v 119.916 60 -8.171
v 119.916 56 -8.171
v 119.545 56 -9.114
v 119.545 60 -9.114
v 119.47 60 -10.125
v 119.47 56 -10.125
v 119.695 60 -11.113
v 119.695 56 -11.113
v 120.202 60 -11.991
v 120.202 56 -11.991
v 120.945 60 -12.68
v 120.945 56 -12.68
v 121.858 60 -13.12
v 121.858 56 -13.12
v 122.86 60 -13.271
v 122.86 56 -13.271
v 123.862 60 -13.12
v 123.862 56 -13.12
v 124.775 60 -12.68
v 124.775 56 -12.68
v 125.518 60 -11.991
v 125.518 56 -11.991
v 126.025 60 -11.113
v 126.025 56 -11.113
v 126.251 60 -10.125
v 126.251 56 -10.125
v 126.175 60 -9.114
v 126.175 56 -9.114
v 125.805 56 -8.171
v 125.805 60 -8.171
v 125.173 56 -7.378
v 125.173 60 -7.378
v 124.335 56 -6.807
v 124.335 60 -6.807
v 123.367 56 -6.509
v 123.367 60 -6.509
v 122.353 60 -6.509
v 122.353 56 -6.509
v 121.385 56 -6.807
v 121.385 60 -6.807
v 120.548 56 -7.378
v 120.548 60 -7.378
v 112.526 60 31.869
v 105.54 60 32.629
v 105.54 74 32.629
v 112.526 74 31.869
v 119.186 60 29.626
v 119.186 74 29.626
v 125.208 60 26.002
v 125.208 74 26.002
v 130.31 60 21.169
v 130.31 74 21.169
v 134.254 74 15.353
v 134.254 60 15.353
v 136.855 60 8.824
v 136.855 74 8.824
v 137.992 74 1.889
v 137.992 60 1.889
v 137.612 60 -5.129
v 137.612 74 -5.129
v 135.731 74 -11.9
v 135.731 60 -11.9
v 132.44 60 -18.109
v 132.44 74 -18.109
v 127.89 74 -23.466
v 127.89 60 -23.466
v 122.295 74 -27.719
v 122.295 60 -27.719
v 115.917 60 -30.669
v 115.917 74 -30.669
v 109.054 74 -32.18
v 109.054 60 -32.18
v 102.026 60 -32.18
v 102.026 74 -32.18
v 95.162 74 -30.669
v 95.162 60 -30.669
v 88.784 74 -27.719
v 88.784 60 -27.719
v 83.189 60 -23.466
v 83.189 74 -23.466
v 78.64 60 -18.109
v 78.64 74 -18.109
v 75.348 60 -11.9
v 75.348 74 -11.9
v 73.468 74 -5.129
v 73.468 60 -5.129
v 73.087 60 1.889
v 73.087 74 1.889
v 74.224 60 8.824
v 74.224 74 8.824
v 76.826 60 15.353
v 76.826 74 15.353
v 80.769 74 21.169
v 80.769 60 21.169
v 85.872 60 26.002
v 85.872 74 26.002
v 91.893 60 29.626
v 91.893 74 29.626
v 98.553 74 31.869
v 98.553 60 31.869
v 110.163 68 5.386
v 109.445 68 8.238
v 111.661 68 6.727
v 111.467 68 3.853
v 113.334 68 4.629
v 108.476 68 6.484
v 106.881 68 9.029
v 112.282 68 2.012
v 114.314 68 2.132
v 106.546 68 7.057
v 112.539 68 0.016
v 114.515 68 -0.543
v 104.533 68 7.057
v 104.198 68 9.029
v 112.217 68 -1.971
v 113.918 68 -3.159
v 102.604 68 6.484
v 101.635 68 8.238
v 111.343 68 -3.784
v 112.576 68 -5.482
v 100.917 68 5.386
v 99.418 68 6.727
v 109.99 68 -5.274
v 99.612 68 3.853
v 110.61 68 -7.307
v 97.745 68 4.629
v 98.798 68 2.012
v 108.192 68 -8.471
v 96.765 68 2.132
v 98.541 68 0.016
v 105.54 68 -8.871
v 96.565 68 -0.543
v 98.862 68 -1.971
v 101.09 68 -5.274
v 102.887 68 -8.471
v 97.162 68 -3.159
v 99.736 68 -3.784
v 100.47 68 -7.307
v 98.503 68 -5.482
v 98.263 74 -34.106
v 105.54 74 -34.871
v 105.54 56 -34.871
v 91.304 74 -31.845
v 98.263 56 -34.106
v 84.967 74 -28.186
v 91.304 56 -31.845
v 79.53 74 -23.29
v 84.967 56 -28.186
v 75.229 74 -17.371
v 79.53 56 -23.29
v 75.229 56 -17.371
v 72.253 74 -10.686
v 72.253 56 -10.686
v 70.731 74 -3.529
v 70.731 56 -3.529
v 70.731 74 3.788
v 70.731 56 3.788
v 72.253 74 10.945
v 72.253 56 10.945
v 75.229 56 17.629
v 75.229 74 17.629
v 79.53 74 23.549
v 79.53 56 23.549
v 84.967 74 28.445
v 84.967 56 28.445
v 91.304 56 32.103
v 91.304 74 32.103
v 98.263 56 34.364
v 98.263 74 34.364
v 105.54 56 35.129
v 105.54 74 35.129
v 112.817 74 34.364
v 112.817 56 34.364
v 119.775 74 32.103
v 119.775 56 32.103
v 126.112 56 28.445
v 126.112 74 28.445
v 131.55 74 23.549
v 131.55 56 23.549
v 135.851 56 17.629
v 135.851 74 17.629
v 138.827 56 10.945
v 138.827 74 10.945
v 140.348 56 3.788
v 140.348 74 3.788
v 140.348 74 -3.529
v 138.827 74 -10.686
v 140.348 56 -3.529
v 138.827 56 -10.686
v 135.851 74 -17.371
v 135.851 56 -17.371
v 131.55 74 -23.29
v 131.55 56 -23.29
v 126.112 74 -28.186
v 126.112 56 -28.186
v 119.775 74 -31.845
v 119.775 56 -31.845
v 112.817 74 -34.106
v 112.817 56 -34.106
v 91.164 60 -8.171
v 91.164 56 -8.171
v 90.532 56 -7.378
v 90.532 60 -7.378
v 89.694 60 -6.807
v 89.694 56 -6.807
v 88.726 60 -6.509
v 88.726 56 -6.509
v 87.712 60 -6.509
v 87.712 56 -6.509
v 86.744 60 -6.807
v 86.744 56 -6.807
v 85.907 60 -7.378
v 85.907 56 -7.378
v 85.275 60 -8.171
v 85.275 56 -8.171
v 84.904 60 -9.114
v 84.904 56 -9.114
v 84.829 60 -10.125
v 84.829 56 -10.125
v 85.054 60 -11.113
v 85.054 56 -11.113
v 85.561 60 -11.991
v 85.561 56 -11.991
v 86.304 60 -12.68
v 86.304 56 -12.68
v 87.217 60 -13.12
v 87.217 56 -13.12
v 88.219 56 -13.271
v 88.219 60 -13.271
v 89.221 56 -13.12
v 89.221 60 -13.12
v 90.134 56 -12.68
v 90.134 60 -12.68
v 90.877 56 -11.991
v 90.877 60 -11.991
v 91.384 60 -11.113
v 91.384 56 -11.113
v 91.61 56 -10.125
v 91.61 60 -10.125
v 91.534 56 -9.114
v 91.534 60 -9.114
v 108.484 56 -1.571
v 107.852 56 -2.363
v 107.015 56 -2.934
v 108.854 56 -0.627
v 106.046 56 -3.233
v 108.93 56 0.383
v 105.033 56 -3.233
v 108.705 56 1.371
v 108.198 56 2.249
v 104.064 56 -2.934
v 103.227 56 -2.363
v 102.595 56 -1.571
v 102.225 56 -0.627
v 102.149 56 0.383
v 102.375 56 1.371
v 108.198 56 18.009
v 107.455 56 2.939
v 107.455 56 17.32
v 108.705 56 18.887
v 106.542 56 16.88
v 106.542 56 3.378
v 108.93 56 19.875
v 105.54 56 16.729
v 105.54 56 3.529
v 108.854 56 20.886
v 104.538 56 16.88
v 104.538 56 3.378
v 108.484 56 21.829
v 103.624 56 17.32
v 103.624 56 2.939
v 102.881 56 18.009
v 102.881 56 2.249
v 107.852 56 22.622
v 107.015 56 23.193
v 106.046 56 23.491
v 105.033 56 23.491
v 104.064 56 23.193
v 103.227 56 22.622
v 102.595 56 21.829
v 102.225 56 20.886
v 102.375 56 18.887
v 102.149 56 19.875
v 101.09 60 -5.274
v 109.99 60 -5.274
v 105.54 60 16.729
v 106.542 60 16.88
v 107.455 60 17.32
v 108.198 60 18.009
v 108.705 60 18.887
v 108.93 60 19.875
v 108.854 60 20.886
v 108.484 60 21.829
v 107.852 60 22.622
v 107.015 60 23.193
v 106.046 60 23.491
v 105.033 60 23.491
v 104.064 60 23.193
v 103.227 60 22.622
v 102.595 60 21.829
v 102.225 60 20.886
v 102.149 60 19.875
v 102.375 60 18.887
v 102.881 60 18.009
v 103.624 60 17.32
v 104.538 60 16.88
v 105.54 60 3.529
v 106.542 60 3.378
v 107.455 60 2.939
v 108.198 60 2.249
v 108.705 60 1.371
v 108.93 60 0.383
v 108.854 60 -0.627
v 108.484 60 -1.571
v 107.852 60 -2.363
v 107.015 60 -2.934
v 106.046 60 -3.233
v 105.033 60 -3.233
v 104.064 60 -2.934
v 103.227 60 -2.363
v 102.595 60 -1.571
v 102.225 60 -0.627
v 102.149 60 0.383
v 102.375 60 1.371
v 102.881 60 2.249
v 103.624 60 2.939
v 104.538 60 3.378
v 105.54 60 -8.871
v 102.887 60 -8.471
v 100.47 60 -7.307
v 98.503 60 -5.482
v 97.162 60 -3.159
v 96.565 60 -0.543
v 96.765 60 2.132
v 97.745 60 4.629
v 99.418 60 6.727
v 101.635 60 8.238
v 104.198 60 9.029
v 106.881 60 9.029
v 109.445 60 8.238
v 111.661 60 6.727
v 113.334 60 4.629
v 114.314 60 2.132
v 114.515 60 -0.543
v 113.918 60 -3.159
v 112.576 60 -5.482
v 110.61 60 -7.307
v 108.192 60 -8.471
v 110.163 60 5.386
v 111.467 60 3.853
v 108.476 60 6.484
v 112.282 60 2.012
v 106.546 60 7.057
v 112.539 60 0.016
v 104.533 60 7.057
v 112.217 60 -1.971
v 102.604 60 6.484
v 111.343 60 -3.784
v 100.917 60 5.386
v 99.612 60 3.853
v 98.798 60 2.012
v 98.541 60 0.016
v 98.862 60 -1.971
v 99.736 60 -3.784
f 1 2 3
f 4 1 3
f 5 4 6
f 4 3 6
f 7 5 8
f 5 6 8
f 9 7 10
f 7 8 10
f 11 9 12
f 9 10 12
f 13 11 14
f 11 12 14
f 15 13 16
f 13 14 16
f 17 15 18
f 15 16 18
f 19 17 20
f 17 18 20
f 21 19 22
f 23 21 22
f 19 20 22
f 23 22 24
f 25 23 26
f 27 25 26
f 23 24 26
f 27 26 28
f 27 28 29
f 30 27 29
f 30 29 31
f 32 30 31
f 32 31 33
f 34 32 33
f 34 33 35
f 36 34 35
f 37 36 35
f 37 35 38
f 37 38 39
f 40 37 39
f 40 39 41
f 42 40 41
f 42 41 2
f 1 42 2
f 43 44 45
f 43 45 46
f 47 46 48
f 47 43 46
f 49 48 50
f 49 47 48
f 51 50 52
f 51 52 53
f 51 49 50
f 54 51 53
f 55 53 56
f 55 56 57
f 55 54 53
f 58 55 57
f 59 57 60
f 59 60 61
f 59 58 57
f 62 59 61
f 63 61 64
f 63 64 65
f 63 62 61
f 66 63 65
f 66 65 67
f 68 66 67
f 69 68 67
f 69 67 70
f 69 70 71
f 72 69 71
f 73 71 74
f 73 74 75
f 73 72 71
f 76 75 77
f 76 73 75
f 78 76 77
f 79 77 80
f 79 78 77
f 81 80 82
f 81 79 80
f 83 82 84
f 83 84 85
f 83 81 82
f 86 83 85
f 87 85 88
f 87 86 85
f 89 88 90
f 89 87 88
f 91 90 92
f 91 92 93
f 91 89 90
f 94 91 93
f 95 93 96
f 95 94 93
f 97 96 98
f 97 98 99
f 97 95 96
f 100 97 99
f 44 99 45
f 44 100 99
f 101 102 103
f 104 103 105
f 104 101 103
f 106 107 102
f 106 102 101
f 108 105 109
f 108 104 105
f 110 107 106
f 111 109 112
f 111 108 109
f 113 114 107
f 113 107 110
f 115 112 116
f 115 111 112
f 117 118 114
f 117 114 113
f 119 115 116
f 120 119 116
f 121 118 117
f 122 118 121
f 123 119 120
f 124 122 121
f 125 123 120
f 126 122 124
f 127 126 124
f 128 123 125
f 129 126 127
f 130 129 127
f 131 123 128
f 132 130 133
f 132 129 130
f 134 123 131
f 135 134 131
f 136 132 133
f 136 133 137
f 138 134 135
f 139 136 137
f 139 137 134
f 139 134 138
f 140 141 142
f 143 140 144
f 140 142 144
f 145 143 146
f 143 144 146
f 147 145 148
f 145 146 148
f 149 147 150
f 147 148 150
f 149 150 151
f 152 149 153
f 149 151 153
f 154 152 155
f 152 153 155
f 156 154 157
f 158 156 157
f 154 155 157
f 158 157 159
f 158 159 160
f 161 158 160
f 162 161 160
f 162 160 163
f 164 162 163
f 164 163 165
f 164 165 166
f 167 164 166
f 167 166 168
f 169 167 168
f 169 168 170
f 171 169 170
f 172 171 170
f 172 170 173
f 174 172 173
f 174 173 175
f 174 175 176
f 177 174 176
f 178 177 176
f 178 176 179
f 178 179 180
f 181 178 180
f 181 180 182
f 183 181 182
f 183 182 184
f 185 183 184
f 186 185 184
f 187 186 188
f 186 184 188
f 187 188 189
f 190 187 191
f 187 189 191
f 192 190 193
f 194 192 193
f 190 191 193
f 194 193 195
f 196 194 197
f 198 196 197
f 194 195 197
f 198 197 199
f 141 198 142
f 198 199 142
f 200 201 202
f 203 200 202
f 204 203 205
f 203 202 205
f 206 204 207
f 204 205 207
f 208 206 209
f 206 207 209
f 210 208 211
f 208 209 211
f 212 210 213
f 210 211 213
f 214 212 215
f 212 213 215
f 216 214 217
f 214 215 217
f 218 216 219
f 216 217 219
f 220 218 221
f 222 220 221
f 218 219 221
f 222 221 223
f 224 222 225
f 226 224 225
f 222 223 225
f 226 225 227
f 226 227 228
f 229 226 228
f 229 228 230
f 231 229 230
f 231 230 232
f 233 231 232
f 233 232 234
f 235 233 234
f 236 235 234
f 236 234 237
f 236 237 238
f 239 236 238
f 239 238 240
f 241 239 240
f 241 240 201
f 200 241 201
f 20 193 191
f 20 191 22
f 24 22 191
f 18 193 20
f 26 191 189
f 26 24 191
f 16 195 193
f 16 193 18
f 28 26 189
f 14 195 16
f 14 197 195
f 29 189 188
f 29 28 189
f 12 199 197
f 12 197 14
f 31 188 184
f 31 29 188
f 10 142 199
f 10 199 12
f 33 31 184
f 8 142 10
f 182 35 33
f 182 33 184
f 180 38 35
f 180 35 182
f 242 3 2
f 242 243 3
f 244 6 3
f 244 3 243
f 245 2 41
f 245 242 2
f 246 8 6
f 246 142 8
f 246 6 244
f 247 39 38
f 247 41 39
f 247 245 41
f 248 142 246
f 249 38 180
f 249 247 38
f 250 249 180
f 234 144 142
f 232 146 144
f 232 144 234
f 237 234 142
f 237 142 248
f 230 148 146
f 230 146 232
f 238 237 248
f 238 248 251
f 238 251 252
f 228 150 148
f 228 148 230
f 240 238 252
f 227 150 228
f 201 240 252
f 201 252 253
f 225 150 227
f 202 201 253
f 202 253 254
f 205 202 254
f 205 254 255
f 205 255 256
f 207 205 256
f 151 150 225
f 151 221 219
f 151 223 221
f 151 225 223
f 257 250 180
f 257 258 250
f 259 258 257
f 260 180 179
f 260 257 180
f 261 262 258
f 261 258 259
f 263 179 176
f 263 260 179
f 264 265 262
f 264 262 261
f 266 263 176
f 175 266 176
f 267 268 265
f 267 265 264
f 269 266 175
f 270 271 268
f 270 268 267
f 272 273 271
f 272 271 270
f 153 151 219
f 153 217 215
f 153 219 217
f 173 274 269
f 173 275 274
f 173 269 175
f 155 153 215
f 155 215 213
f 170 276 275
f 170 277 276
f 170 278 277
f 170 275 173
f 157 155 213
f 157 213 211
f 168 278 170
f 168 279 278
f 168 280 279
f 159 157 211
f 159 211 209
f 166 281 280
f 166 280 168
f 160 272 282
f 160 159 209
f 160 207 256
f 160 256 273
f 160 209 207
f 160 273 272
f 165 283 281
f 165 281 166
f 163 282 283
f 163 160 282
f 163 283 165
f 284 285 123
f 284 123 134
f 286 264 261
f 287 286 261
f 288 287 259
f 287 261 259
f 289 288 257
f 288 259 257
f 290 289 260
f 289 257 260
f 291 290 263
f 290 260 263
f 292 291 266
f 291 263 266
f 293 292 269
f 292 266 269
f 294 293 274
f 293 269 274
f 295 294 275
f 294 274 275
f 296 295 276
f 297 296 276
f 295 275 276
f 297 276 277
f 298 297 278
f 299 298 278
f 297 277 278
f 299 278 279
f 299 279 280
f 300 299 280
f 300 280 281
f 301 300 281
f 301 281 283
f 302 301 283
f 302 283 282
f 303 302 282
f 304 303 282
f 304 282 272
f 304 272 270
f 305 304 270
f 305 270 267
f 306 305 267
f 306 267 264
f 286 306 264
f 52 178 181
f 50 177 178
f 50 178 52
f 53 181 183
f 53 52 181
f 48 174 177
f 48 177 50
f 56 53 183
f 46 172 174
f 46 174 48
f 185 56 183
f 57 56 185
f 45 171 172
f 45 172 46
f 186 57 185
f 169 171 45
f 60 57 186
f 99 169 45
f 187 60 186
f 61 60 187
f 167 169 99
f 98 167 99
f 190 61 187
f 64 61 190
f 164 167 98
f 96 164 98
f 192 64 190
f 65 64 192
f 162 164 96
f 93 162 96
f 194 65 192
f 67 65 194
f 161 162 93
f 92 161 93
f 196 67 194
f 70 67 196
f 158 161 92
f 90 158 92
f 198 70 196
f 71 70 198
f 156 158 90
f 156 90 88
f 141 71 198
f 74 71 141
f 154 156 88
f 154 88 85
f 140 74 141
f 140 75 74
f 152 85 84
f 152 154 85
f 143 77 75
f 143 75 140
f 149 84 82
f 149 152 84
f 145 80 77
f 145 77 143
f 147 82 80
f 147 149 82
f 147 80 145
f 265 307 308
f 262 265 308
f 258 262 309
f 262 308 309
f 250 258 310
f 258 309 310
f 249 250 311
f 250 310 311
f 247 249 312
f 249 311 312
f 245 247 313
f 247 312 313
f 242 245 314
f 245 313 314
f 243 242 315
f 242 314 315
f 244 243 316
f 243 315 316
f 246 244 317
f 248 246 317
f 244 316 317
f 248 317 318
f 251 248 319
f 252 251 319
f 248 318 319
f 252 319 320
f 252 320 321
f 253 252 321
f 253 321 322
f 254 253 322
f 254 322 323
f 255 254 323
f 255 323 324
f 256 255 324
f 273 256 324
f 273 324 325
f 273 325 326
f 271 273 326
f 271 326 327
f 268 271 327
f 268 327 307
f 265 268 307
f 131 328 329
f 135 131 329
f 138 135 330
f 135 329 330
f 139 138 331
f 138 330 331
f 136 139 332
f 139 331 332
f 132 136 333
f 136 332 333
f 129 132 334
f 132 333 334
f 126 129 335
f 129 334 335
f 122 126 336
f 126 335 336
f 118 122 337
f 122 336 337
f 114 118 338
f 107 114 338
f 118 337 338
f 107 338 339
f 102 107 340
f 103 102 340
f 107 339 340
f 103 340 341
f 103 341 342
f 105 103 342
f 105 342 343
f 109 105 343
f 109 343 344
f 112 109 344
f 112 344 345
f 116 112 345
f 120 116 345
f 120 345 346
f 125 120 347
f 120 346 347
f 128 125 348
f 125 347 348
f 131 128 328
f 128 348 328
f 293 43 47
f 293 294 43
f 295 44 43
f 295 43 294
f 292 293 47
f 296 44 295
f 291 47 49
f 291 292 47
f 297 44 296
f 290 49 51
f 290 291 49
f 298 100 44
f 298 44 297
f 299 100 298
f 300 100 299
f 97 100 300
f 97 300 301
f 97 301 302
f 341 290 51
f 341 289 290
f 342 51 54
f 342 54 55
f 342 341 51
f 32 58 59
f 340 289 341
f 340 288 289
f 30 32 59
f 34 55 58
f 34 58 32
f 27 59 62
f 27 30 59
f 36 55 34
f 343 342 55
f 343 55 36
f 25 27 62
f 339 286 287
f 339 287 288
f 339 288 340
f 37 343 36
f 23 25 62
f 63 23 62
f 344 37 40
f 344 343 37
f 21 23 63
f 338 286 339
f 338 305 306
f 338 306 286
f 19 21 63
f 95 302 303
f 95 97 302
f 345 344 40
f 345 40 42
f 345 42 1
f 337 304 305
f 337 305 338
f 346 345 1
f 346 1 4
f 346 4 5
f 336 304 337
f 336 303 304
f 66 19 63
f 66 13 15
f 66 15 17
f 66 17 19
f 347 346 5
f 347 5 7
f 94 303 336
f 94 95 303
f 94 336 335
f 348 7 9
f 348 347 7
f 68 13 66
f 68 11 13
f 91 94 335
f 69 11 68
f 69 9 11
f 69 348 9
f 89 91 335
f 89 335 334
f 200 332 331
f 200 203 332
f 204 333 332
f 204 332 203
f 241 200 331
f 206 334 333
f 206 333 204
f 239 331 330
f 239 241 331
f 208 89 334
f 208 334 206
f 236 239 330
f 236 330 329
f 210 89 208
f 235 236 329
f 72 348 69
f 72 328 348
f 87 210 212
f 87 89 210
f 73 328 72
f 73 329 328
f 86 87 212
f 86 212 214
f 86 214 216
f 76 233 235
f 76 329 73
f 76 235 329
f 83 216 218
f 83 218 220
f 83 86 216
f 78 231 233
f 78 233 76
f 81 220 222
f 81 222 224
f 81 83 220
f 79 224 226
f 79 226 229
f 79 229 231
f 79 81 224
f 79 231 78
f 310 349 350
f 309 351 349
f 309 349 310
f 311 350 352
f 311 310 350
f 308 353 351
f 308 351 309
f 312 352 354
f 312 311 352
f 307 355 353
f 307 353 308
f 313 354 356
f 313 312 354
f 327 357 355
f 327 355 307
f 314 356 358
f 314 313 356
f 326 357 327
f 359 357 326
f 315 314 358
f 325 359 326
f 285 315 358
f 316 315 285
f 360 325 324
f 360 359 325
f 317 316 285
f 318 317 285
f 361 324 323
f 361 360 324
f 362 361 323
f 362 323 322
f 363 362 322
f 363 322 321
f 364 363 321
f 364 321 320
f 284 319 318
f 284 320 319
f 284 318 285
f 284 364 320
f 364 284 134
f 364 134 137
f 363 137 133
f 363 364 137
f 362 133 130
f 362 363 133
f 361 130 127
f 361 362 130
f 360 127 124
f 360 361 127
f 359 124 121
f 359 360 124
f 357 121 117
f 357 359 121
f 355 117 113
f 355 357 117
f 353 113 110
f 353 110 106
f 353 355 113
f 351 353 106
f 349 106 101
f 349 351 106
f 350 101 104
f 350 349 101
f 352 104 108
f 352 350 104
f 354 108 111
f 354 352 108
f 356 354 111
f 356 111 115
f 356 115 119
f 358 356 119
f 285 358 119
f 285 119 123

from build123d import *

# Parameters (mm, degrees)
BOSS_EXTRUDE1_DEPTH = 150
SKETCH2_R           = 35
SKETCH2_R_2         = 32.5
BOSS_EXTRUDE2_DEPTH = 14
SKETCH3_R           = 9
BOSS_EXTRUDE3_DEPTH = 8
SKETCH5_R           = 3.4
CUT_EXTRUDE1_DEPTH  = 14
CUT_EXTRUDE4_DEPTH  = 154
CUT_EXTRUDE6_START  = -4
CUT_EXTRUDE6_DEPTH  = 4
CUT_EXTRUDE7_START  = -4
CUT_EXTRUDE7_DEPTH  = 4
SKETCH13_R          = 3.4
CUT_EXTRUDE8_DEPTH  = 10
CIRPATTERN1_COUNT   = 3


with BuildPart() as part:
    # Sketch1 → Boss-Extrude1 (new body)
    with BuildSketch(Plane.YZ):
        Polygon((-60, -45), (-60, 45), (60, 45), (60, -45), (56, -45), (56, 41), (-56, 41), (-56, -45), align=None)
    extrude(amount=BOSS_EXTRUDE1_DEPTH)

    # Sketch2 → Boss-Extrude2 (add)
    with BuildSketch(Plane(origin=(0, 60, 0), x_dir=(-1, 0, 0), z_dir=(0, 1, 0))):
        with Locations(Location((-105.539679059, 0.129309752, 0), (0, 0, 270))):
            Circle(SKETCH2_R)
        with Locations(Location((-105.539679059, 0.129309752, 0), (0, 0, 90))):
            Circle(SKETCH2_R_2, mode=Mode.SUBTRACT)
    extrude(amount=BOSS_EXTRUDE2_DEPTH)

    # Sketch3 → Boss-Extrude3 (add)
    with BuildSketch(Plane(origin=(0, 60, 0), x_dir=(-1, 0, 0), z_dir=(0, 1, 0))):
        with Locations(Location((-105.539679059, 0.129309752, 0), (0, 0, 270))):
            Circle(SKETCH3_R)
        with BuildLine():
            Line((-109.989679059, -5.274161354), (-101.089679059, -5.274161354))
            ThreePointArc((-101.089679059, -5.274161354), (-105.539679059, 7.129309752), (-109.989679059, -5.274161354))
        make_face(mode=Mode.SUBTRACT)
    extrude(amount=BOSS_EXTRUDE3_DEPTH)

    # Sketch5 → Cut-Extrude1 (cut)
    with BuildSketch(Plane(origin=(0, 60, 0), x_dir=(-1, 0, 0), z_dir=(0, 1, 0))):
        with Locations(Location((-105.539679059, 0.129309752, 0), (0, 0, 90))):
            Circle(SKETCH5_R)
    extrude(amount=-CUT_EXTRUDE1_DEPTH, mode=Mode.SUBTRACT)

    # Sketch8 → Cut-Extrude4 (cut)
    with BuildSketch(Plane.YZ.offset(150)):
        Polygon((60, 35.129309752), (56, 35.129309752), (56, -34.870690248), (60, -34.870690248), (60, -45), (56, -45), (-60, -45), (-60, 45), (56, 45), (60, 45), align=None)
    extrude(amount=-CUT_EXTRUDE4_DEPTH, mode=Mode.SUBTRACT)

    # Sketch11 → Cut-Extrude6 (cut)
    with BuildSketch(Plane(origin=(0, 60, 0), x_dir=(-1, 0, 0), z_dir=(0, 1, 0)).offset(CUT_EXTRUDE6_START)):
        with BuildLine():
            Line((-150, 35.129309752), (-105.539679059, 35.129309752))
            ThreePointArc((-105.539679059, 35.129309752), (-140.539679059, 0.129309752), (-105.539679059, -34.870690248))
            Line((-105.539679059, -34.870690248), (-150, -34.870690248))
            Line((-150, -34.870690248), (-150, 35.129309752))
        make_face()
    extrude(amount=CUT_EXTRUDE6_DEPTH, mode=Mode.SUBTRACT)

    # Sketch12 → Cut-Extrude7 (cut)
    with BuildSketch(Plane(origin=(0, 60, 0), x_dir=(-1, 0, 0), z_dir=(0, 1, 0)).offset(CUT_EXTRUDE7_START)):
        with BuildLine():
            Line((-105.539679059, 35.129309752), (0, 35.129309752))
            Line((0, 35.129309752), (0, -34.870690248))
            Line((0, -34.870690248), (-105.539679059, -34.870690248))
            ThreePointArc((-105.539679059, -34.870690248), (-70.539679059, 0.129309752), (-105.539679059, 35.129309752))
        make_face()
    extrude(amount=CUT_EXTRUDE7_DEPTH, mode=Mode.SUBTRACT)

    # Sketch13 → Cut-Extrude8 (cut)
    with BuildSketch(Plane.XZ.offset(-56)):
        with Locations(Location((105.539679059, 20.129309752, 0), (0, 0, 270))):
            Circle(SKETCH13_R)
    cut_extrude8 = extrude(amount=-CUT_EXTRUDE8_DEPTH, mode=Mode.SUBTRACT)

    # CirPattern1: Cut-Extrude8 ×3 about axis
    cirpattern1_axis = Axis((105.539679059, 0, 0.129309752), (0, 1, 0))
    for i in range(1, CIRPATTERN1_COUNT):
        add(cut_extrude8.rotate(cirpattern1_axis, i * 360 / CIRPATTERN1_COUNT), mode=Mode.SUBTRACT)


solid = part.part
